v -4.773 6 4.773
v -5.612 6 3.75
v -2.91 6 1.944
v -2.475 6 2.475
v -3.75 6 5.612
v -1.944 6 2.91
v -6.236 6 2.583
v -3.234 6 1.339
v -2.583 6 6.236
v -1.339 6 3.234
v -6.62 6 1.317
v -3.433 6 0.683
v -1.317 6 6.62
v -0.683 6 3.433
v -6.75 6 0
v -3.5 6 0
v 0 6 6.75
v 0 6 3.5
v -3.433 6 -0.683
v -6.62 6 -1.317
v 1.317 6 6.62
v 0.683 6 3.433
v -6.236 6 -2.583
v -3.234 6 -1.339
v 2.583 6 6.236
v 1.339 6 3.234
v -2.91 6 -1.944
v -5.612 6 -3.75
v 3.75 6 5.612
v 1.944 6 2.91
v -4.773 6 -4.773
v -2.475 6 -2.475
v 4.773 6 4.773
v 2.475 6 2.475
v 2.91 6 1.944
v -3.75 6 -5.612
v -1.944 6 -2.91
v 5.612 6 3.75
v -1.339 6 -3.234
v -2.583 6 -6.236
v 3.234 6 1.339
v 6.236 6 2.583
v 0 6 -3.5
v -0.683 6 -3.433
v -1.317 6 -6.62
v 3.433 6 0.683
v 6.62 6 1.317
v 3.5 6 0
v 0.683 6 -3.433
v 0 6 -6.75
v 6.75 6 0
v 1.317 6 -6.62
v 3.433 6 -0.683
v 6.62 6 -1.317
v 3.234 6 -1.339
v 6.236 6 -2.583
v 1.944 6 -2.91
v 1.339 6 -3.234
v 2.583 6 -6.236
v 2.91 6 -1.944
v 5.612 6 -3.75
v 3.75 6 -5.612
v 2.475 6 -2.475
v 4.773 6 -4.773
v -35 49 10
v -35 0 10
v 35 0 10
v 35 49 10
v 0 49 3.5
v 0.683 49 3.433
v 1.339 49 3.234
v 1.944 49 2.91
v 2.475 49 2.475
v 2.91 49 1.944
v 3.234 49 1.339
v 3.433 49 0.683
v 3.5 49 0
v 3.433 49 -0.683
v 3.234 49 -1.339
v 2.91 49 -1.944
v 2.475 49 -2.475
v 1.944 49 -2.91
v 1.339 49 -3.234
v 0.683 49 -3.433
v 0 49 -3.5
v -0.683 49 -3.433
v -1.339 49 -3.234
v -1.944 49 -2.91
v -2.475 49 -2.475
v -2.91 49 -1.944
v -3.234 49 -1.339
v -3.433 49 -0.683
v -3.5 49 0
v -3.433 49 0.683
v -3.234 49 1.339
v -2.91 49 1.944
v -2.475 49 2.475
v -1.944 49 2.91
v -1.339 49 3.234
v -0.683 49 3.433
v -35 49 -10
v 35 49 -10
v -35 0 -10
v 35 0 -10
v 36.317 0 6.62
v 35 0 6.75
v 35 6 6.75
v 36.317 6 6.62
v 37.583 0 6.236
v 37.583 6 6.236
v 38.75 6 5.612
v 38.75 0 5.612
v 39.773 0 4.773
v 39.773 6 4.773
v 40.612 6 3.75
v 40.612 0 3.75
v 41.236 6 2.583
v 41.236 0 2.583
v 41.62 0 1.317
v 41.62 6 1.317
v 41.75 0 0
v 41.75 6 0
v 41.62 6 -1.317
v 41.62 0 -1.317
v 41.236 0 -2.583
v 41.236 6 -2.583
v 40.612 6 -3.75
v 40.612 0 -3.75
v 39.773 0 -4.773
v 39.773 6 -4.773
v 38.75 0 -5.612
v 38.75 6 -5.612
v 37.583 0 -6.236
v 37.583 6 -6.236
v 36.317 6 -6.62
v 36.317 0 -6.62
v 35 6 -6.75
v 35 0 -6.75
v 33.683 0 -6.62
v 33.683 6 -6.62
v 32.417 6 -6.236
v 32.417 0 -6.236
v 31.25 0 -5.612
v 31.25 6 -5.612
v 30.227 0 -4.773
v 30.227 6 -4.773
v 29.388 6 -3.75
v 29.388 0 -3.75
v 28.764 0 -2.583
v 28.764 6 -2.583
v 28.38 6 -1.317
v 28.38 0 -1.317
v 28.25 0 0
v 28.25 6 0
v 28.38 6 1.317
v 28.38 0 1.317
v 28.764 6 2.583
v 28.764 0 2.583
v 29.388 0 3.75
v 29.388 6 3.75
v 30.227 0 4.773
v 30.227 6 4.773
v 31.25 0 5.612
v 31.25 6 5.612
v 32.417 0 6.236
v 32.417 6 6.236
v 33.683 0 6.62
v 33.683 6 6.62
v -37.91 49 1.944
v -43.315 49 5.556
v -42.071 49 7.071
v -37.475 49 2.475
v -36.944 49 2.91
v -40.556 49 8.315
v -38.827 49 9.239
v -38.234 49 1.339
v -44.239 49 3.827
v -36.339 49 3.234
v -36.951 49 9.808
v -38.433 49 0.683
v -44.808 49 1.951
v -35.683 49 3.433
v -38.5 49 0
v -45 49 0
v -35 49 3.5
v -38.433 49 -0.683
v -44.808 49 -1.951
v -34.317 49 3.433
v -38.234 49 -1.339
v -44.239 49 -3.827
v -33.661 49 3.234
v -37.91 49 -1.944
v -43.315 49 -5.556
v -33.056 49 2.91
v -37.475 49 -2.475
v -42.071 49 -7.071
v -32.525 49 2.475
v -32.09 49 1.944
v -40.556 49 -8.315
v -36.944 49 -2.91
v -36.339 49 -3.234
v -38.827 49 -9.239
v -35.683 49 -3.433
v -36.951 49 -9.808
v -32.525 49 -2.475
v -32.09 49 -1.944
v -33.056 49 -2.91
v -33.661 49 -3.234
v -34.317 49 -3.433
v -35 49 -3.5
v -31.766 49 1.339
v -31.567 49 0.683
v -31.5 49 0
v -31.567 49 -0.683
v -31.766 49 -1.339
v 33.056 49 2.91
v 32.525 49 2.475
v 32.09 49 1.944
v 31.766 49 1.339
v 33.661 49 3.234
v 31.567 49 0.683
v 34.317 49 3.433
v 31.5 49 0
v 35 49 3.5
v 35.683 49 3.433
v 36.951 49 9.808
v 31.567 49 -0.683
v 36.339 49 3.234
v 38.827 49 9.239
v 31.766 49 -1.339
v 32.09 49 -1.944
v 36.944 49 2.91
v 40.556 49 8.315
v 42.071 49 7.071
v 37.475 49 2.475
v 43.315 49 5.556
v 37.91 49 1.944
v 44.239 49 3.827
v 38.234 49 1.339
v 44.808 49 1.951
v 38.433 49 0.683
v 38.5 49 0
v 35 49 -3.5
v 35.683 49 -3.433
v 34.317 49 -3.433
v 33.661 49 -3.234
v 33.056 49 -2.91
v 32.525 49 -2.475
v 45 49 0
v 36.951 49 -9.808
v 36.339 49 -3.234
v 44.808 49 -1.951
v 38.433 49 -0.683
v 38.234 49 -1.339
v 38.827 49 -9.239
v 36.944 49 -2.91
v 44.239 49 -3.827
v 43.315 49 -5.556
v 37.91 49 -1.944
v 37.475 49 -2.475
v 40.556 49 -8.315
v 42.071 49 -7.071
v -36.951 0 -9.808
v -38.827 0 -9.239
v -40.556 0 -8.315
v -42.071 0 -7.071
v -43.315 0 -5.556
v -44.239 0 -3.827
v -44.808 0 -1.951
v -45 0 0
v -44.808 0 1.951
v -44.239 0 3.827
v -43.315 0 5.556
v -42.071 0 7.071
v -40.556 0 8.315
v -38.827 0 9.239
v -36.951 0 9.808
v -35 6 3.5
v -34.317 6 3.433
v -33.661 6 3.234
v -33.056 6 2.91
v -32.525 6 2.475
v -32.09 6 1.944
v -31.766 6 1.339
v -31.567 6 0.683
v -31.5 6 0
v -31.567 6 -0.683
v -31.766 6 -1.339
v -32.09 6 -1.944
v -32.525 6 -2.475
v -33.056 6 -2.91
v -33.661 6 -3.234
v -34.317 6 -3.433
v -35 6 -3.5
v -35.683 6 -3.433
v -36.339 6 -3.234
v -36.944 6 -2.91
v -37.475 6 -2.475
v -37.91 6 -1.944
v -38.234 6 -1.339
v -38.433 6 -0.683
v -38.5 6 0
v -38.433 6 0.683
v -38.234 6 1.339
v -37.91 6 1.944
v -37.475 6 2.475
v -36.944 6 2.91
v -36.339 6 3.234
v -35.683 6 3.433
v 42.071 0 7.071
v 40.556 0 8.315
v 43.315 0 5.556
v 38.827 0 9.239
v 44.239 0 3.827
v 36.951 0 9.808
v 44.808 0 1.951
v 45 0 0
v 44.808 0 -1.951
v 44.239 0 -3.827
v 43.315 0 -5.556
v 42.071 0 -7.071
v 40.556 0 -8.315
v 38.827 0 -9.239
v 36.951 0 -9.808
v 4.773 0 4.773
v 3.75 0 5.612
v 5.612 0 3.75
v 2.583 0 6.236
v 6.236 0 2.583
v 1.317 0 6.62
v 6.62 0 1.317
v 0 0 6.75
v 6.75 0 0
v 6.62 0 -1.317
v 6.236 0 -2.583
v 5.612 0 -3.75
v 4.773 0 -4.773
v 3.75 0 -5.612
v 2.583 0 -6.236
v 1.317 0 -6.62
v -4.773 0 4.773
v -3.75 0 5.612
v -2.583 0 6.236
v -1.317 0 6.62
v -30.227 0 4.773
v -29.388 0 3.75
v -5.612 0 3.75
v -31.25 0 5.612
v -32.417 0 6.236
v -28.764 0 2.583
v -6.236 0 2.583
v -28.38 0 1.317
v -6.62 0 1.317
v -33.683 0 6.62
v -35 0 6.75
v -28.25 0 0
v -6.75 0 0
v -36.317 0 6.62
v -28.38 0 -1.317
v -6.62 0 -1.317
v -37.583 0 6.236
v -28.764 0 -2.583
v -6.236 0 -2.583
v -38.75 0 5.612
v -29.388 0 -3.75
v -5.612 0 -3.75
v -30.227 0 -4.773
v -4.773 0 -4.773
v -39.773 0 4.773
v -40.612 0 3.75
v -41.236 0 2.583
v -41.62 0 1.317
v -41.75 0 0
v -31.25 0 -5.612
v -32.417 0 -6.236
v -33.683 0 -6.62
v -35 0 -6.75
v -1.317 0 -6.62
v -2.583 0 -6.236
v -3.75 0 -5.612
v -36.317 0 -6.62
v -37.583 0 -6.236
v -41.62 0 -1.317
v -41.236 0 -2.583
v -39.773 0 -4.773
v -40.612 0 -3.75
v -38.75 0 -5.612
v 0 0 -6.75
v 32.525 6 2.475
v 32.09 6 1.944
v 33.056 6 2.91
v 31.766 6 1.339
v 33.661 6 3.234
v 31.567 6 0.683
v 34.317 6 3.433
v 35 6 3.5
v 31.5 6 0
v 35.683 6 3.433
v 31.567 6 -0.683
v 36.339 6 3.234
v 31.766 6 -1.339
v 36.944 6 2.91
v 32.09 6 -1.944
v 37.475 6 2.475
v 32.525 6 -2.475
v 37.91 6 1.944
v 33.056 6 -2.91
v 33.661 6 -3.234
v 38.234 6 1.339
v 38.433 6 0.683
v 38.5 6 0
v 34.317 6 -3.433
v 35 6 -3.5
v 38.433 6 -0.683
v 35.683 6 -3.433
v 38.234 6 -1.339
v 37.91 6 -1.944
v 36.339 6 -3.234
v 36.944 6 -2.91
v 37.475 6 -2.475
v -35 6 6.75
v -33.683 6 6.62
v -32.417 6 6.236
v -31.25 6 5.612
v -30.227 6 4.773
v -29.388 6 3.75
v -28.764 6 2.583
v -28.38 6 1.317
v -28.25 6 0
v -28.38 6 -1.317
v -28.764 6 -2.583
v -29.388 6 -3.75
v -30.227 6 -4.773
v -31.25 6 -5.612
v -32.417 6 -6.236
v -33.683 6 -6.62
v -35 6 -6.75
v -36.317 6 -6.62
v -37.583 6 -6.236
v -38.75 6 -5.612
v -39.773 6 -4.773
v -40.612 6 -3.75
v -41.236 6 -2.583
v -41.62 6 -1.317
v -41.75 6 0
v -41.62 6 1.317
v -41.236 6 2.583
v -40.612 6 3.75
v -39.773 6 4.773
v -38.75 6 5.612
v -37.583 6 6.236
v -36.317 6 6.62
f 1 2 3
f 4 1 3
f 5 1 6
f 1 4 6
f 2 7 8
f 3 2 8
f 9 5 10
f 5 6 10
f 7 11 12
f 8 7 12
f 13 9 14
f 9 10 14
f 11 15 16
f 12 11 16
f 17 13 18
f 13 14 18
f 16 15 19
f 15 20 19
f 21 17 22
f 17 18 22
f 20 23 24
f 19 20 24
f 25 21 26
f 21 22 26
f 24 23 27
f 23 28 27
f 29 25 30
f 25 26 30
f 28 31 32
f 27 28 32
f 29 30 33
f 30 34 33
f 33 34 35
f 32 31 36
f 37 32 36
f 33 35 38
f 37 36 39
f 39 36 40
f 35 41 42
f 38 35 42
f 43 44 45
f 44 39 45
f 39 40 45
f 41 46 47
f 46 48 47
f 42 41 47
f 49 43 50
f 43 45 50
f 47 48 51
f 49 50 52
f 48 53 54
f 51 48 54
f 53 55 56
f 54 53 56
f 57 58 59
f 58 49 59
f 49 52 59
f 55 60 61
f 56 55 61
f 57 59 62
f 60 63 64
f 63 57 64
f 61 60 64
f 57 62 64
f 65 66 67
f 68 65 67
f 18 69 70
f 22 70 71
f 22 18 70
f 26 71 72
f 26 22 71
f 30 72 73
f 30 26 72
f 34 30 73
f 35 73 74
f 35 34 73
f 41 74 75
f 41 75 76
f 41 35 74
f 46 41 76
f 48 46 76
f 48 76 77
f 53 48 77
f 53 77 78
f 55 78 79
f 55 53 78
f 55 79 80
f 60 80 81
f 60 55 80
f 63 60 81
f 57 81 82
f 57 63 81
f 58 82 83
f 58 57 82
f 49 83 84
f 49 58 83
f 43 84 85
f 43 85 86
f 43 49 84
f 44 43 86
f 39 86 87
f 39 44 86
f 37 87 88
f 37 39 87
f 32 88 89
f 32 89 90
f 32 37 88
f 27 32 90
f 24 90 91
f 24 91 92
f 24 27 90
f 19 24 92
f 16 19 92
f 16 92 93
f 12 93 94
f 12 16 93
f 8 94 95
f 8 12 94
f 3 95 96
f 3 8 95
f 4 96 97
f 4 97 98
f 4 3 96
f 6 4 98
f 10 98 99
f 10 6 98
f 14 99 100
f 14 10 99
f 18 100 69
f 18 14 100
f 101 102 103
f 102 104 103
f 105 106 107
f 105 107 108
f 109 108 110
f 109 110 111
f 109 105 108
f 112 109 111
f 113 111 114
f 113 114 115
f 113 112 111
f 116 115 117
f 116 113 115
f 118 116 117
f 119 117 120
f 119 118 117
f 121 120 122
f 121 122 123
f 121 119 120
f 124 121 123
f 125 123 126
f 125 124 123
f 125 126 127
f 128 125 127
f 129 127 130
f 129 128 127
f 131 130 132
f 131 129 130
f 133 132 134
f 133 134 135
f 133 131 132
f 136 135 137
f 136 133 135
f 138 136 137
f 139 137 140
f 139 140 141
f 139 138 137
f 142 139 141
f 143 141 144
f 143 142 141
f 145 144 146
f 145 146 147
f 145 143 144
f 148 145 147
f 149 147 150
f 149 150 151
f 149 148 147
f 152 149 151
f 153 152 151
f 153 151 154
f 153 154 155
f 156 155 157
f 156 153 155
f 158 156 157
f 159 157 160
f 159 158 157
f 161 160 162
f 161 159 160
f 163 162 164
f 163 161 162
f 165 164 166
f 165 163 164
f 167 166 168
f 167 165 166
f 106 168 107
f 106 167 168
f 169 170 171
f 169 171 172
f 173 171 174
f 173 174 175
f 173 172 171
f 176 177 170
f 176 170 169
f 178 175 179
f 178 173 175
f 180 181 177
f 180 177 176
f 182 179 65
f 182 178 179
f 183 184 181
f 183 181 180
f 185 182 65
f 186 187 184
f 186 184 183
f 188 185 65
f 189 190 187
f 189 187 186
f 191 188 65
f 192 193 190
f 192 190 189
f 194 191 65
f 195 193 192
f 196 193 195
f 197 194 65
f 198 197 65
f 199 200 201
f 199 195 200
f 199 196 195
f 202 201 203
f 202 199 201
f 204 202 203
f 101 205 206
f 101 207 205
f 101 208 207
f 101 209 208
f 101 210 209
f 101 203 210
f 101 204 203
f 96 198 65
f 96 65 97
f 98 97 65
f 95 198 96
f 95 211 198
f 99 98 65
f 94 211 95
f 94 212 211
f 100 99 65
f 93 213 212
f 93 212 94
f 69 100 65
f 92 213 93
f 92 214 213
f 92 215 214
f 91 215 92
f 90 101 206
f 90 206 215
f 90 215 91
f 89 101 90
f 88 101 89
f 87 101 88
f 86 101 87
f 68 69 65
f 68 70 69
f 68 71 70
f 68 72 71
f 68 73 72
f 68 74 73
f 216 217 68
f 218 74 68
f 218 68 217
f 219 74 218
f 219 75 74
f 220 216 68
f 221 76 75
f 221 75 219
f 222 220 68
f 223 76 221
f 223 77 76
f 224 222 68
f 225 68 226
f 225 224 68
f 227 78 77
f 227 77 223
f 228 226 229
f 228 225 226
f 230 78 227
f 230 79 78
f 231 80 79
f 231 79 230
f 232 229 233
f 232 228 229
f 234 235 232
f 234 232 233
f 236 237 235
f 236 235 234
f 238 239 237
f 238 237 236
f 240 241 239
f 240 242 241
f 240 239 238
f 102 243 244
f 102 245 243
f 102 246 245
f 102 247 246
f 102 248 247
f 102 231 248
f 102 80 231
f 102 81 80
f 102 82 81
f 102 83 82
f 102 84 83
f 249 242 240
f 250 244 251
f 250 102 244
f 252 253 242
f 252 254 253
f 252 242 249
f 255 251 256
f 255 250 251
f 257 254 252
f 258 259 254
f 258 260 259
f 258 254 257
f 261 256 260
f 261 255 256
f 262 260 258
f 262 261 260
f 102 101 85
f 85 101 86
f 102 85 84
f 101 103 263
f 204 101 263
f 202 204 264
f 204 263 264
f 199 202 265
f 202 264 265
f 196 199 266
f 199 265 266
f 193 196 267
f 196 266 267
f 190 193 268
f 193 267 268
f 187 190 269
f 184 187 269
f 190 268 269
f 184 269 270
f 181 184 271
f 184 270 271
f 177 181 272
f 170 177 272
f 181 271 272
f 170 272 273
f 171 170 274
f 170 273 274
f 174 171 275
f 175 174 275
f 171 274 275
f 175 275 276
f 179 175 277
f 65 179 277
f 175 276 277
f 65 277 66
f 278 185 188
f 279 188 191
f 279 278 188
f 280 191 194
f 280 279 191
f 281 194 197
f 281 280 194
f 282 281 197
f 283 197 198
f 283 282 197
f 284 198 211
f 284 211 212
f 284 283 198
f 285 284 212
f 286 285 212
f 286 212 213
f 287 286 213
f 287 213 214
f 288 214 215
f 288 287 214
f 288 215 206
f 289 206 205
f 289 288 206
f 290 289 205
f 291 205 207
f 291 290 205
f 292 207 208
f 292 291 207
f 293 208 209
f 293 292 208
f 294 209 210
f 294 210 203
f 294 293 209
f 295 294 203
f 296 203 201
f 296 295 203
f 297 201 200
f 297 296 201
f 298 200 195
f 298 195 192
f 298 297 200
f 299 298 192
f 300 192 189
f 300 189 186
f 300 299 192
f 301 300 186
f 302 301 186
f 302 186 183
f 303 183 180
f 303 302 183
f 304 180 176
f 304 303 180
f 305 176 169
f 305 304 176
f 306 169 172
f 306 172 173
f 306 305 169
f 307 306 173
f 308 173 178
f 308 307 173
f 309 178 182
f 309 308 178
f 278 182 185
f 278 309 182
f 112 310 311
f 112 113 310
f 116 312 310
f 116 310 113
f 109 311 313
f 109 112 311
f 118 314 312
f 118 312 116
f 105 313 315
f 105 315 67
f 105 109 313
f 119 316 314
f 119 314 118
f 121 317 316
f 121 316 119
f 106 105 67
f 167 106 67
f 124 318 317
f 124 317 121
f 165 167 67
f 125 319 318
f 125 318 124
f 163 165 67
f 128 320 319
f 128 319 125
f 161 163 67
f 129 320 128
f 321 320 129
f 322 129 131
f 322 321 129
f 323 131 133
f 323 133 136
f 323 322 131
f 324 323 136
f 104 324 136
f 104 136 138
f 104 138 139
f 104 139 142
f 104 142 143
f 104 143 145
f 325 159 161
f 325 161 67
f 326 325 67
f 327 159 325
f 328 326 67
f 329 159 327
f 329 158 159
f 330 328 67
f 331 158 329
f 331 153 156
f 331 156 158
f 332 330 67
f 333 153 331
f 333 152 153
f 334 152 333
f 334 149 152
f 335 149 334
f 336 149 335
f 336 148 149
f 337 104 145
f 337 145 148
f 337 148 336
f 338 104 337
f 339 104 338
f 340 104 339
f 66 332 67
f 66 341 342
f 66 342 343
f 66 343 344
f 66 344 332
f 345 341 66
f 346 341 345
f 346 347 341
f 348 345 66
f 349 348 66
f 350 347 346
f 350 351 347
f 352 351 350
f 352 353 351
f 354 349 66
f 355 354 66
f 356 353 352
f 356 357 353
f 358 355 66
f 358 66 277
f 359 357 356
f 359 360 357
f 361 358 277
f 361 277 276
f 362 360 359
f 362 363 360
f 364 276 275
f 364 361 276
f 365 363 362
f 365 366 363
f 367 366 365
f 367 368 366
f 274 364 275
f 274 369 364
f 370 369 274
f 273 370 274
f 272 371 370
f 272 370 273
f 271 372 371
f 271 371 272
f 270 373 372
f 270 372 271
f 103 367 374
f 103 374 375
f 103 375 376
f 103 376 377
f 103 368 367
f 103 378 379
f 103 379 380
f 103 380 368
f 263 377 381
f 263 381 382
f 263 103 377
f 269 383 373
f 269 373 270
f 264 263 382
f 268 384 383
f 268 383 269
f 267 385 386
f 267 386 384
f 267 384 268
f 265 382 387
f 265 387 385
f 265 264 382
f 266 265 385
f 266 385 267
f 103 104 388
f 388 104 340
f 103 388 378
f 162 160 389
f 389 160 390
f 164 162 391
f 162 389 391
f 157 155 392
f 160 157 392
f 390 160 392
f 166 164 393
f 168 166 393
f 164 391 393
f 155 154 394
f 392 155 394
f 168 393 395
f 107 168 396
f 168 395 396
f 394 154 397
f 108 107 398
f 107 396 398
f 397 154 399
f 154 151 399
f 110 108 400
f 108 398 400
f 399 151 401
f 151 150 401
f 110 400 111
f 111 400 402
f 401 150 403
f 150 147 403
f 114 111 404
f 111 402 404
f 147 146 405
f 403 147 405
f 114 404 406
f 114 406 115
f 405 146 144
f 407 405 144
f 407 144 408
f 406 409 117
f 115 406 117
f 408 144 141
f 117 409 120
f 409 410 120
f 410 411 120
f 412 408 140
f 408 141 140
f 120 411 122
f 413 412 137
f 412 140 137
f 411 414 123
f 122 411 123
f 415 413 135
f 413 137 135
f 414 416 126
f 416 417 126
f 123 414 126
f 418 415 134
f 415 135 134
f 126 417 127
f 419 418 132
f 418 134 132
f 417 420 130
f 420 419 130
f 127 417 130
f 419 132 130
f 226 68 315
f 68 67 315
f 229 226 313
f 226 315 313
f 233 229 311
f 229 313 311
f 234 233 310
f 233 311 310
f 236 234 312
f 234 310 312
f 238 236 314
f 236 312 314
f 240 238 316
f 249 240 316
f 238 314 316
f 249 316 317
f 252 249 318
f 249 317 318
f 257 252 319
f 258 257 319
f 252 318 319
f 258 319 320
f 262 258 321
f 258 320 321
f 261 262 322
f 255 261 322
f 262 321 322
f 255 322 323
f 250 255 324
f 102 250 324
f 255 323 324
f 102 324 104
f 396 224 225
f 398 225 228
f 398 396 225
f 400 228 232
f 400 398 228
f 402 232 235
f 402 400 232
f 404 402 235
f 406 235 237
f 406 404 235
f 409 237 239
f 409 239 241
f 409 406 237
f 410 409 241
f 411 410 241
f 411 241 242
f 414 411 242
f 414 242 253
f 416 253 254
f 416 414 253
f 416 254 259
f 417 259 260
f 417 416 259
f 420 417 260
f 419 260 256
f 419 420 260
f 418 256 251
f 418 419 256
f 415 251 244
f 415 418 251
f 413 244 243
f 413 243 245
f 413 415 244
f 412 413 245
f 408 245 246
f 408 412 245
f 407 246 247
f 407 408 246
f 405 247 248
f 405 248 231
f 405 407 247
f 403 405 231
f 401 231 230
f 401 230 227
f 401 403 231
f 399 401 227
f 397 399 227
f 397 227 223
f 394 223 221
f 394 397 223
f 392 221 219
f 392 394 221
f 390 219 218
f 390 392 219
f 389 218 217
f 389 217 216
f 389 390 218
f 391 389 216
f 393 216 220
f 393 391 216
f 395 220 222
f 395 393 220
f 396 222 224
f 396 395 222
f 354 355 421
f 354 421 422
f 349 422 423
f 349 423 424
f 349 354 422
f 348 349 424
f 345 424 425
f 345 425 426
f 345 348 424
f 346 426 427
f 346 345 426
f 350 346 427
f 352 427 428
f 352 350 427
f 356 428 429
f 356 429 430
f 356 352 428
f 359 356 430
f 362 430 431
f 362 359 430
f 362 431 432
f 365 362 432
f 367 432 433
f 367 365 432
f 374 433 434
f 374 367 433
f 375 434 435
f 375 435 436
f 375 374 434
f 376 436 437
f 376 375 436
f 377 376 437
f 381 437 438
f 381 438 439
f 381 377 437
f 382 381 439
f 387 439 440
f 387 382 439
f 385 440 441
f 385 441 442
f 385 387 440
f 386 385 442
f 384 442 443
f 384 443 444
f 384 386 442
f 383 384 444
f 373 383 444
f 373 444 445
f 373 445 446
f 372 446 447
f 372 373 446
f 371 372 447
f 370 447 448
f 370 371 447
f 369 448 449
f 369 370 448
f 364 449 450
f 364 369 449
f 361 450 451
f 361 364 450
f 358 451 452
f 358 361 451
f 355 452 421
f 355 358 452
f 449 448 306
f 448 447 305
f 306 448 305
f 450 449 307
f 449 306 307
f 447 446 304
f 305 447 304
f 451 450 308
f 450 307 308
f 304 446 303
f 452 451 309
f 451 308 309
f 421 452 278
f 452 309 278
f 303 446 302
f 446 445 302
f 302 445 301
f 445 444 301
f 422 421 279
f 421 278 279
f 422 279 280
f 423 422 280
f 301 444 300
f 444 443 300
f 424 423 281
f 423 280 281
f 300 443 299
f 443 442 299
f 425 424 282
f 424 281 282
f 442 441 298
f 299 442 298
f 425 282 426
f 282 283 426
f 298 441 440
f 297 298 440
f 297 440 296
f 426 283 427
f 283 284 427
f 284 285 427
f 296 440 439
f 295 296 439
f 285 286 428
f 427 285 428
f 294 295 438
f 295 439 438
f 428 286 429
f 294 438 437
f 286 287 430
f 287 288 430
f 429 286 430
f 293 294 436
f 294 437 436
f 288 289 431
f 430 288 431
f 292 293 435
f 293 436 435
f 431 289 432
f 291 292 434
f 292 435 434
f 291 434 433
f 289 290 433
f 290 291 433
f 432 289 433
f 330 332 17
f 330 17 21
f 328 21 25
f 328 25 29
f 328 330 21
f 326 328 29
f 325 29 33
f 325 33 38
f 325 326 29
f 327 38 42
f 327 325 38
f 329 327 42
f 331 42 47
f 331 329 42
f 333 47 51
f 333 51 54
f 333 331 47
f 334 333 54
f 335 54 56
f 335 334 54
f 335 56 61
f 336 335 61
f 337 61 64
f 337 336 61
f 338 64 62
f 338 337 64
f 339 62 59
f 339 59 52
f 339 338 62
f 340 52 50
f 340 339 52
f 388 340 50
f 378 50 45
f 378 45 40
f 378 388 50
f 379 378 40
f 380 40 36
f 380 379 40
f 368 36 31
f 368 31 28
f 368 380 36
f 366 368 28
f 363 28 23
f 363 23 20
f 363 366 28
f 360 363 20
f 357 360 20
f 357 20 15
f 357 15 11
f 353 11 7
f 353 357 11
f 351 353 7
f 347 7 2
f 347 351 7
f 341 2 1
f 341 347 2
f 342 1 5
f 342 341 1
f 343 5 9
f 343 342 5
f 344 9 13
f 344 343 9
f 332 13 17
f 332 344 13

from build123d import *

# Parameters (mm, degrees)
SKETCH1_R           = 6.75
BOSS_EXTRUDE1_DEPTH = 6
SKETCH2_R           = 3.5
BOSS_EXTRUDE2_DEPTH = 43


with BuildPart() as part:
    # Sketch1 → Boss-Extrude1 (new body)
    with BuildSketch(Plane(origin=(0, 0, 0), x_dir=(1, 0, 0), z_dir=(0, 1, 0))):
        with BuildLine():
            Line((-35, 10), (35, 10))
            ThreePointArc((35, 10), (45, 0), (35, -10))
            Line((35, -10), (-35, -10))
            ThreePointArc((-35, -10), (-45, 0), (-35, 10))
        make_face()
        with Locations(Location((0, 0, 0), (0, 0, 270))):
            Circle(SKETCH1_R, mode=Mode.SUBTRACT)
        with Locations(Location((35, 0, 0), (0, 0, 270))):
            Circle(SKETCH1_R, mode=Mode.SUBTRACT)
        with Locations(Location((-35, 0, 0), (0, 0, 270))):
            Circle(SKETCH1_R, mode=Mode.SUBTRACT)
    extrude(amount=BOSS_EXTRUDE1_DEPTH)

    # Sketch2 → Boss-Extrude2 (add)
    with BuildSketch(Plane(origin=(0, 6, 0), x_dir=(1, 0, 0), z_dir=(0, 1, 0))):
        with BuildLine():
            Line((-35, -10), (35, -10))
            ThreePointArc((35, -10), (45, 0), (35, 10))
            Line((35, 10), (-35, 10))
            ThreePointArc((-35, 10), (-45, 0), (-35, -10))
        make_face()
        with Locations(Location((-35, 0, 0), (0, 0, 270))):
            Circle(SKETCH2_R, mode=Mode.SUBTRACT)
        with Locations(Location((0, 0, 0), (0, 0, 270))):
            Circle(SKETCH2_R, mode=Mode.SUBTRACT)
        with Locations(Location((35, 0, 0), (0, 0, 270))):
            Circle(SKETCH2_R, mode=Mode.SUBTRACT)
    extrude(amount=BOSS_EXTRUDE2_DEPTH)


solid = part.part
